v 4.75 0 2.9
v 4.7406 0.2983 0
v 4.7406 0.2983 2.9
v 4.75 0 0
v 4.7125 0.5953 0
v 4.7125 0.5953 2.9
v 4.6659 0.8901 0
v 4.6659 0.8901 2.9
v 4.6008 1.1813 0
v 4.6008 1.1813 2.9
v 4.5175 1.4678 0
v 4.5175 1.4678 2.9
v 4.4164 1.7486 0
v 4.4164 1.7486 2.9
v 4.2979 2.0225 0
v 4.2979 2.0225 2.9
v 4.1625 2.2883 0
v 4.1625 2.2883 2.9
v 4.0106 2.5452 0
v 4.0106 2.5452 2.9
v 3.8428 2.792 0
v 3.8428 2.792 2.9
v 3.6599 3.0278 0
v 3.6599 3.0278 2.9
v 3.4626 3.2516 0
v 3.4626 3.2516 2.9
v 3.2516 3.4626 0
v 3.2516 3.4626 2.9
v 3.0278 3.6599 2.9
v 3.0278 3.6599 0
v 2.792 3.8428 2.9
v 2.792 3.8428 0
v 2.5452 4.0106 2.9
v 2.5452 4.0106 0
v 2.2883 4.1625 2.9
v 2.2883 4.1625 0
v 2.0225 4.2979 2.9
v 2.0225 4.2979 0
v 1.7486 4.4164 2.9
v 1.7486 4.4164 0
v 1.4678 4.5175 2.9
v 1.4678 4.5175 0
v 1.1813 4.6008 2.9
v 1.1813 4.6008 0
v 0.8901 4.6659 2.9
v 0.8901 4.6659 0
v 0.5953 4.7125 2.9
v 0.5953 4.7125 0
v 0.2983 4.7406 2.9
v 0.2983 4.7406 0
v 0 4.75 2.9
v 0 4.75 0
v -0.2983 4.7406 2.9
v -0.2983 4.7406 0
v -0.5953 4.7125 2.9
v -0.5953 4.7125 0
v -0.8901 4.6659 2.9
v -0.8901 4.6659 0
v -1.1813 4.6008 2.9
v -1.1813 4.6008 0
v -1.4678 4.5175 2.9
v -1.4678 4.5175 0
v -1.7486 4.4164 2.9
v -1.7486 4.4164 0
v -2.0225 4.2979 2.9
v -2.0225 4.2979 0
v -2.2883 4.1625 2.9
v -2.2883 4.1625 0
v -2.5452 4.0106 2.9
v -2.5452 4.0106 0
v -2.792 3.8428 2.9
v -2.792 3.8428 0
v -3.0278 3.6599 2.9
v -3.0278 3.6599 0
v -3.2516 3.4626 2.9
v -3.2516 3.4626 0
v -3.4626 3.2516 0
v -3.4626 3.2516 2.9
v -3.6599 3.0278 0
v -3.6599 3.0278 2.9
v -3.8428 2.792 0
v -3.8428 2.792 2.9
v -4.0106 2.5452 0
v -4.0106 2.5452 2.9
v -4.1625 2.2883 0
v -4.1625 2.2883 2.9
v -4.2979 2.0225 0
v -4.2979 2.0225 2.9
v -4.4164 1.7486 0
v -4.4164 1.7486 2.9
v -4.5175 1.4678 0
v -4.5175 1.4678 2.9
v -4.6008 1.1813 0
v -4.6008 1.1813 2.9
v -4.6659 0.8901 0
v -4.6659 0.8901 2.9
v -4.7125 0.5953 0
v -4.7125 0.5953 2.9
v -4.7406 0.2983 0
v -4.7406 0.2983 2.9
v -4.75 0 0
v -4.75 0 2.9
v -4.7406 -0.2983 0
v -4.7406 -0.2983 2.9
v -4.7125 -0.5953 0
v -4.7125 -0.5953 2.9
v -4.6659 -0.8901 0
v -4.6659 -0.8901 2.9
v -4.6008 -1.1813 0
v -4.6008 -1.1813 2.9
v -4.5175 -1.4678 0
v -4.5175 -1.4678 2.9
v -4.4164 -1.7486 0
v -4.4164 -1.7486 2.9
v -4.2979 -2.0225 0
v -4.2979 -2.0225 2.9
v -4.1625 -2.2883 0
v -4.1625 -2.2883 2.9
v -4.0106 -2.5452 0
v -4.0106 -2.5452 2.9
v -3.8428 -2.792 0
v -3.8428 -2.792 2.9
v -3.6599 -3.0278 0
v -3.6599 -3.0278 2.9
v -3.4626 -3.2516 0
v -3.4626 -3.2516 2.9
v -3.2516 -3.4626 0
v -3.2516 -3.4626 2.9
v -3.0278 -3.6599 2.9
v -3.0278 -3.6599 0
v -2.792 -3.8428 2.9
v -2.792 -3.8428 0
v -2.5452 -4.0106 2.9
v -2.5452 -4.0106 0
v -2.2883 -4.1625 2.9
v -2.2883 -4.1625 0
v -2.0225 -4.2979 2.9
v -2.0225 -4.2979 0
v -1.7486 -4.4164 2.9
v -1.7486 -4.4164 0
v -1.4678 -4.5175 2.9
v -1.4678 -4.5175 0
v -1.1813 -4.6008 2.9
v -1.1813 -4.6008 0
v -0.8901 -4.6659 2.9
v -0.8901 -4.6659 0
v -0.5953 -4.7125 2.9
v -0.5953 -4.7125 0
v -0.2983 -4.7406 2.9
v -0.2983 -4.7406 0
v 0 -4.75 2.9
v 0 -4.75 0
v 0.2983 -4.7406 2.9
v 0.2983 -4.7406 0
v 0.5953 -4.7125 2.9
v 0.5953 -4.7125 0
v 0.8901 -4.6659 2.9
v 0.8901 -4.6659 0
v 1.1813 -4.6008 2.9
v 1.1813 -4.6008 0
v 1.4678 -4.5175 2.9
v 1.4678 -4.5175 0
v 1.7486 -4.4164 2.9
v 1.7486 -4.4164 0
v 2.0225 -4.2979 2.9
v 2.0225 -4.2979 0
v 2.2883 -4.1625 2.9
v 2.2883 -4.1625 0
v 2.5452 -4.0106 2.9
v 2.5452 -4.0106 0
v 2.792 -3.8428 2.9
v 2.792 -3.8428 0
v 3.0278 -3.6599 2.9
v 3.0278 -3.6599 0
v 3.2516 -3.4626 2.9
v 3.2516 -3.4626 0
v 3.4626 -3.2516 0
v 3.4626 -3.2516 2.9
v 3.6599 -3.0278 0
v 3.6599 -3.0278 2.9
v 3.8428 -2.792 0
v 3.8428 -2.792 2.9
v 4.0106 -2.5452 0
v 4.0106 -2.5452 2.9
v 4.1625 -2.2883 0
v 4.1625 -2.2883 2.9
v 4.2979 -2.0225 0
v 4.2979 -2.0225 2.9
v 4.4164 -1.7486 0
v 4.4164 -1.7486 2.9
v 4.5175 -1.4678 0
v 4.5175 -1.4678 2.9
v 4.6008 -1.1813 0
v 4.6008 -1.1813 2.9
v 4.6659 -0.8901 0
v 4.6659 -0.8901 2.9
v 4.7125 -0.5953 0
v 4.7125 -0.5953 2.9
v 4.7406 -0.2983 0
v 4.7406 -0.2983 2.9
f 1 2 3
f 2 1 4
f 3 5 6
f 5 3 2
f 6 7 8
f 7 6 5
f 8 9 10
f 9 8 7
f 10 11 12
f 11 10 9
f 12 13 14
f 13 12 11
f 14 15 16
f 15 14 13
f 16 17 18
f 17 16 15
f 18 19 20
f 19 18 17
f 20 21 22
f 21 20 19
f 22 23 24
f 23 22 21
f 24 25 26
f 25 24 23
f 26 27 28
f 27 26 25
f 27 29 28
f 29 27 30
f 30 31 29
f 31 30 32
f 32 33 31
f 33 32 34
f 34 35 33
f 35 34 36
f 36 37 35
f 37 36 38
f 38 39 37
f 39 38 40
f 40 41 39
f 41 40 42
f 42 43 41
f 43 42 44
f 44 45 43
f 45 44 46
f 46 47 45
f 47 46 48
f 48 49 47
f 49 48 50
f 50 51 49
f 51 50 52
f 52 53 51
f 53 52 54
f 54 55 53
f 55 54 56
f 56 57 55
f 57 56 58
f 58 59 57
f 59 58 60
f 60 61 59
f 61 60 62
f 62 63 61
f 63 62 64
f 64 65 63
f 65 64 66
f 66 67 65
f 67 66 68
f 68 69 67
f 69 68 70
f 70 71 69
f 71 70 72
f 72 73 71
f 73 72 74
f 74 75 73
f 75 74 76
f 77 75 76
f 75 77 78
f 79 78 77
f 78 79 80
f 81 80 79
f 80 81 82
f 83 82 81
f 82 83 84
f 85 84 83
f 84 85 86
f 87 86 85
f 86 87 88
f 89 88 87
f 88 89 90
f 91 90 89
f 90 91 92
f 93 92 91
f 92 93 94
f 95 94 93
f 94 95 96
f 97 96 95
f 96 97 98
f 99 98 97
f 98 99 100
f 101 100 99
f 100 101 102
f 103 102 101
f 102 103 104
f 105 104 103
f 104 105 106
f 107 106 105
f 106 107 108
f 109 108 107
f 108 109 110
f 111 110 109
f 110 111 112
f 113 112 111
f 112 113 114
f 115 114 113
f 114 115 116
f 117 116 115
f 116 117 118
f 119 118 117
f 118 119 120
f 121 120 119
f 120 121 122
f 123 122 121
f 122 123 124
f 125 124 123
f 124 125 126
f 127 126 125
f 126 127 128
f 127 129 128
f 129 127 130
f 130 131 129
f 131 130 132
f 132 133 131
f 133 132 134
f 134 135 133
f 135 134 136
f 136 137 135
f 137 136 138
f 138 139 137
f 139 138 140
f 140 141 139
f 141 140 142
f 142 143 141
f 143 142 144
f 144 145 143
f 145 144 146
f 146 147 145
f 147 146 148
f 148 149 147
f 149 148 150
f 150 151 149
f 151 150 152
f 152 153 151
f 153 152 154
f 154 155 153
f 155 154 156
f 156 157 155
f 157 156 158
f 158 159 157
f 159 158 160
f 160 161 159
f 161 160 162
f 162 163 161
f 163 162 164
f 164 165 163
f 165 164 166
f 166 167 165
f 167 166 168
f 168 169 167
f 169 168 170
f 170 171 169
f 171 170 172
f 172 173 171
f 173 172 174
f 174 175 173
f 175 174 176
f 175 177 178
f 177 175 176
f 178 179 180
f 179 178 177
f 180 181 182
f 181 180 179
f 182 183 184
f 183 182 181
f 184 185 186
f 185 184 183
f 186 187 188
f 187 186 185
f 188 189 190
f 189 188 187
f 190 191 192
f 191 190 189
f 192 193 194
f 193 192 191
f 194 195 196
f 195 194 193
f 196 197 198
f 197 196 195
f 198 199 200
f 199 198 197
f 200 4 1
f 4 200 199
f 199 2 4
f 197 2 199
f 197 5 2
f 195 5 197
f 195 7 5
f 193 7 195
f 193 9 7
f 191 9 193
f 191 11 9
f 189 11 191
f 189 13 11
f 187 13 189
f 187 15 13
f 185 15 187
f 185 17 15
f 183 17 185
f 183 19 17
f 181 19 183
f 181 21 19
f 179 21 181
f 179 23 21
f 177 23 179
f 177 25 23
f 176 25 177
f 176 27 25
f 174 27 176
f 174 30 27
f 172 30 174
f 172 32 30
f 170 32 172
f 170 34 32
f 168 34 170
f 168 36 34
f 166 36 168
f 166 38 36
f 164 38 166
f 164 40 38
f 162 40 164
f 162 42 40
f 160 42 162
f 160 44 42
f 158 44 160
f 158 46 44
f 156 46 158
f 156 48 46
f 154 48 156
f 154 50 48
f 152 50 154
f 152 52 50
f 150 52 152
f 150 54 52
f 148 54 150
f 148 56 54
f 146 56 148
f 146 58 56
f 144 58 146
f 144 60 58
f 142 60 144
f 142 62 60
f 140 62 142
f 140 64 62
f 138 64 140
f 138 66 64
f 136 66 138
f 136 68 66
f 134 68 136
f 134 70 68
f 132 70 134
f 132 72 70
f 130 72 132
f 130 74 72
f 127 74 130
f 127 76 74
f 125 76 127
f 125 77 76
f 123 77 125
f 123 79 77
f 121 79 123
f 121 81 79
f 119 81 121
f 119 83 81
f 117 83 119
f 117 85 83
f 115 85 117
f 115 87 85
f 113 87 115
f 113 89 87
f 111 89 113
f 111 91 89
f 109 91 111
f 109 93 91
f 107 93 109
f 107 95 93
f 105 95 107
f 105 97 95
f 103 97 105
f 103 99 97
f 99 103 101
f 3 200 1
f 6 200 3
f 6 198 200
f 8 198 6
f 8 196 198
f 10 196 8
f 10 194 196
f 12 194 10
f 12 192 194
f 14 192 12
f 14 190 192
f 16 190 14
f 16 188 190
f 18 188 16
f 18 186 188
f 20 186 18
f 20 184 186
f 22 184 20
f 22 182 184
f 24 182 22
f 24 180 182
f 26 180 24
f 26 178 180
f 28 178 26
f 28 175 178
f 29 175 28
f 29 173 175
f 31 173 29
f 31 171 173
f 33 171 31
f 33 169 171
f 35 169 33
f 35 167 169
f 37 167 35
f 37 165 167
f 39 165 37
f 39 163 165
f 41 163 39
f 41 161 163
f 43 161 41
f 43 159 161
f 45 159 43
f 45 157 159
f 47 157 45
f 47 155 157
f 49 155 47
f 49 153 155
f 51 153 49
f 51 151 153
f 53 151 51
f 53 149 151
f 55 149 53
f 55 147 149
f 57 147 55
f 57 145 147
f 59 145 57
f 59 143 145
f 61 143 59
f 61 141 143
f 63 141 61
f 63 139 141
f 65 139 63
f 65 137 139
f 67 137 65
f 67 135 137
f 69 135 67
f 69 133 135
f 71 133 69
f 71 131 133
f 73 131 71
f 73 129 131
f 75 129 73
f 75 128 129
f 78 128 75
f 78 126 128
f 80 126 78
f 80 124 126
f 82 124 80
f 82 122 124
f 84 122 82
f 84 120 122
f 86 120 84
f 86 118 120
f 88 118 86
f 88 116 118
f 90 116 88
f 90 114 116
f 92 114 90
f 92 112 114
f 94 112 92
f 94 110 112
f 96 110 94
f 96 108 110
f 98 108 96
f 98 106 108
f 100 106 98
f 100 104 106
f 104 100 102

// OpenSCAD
/*******************************************************************************
 * This is just a cylinder.
 *
 * I have magnetic discs which are 9.5mm x 1.6mm (diameter x thickness). For
 * my miniature shelves, I use corkboard to create a rough, ground or rock like
 * texture. I want the miniatures to be secure on the shelf without looking like
 * I've clamped them down, so my plan is to use magnets on the base and the
 * shelf. Glue doesn't work great for corkboard though, and I fear the magnets
 * will tear off of the corkboard - especially given the strength of the magnets
 * I'm using. My plan is to carve a roughly cylindrical hole in the corkboard
 * where I want the magnetic disc to go, and then use an insert glue directly to
 * the shelf base, which then the magnet can be glued to. The magnet won't be
 * glued to the corkboard directly.
 *
 * The height of the cylinder needs to be the corkboard's thickness - the
 * magnet's thickness. This keeps the magnet from rising above the corkboard's
 * base. The diameter is the magnet's diameter.
 ******************************************************************************/

magnetThickness=1.6;
magnetDiameter=9.5;
baseThickness=5.0;
fudgeThickness=0.5;

$fn=100;
cylinder(d=magnetDiameter, h=baseThickness - fudgeThickness - magnetThickness);
